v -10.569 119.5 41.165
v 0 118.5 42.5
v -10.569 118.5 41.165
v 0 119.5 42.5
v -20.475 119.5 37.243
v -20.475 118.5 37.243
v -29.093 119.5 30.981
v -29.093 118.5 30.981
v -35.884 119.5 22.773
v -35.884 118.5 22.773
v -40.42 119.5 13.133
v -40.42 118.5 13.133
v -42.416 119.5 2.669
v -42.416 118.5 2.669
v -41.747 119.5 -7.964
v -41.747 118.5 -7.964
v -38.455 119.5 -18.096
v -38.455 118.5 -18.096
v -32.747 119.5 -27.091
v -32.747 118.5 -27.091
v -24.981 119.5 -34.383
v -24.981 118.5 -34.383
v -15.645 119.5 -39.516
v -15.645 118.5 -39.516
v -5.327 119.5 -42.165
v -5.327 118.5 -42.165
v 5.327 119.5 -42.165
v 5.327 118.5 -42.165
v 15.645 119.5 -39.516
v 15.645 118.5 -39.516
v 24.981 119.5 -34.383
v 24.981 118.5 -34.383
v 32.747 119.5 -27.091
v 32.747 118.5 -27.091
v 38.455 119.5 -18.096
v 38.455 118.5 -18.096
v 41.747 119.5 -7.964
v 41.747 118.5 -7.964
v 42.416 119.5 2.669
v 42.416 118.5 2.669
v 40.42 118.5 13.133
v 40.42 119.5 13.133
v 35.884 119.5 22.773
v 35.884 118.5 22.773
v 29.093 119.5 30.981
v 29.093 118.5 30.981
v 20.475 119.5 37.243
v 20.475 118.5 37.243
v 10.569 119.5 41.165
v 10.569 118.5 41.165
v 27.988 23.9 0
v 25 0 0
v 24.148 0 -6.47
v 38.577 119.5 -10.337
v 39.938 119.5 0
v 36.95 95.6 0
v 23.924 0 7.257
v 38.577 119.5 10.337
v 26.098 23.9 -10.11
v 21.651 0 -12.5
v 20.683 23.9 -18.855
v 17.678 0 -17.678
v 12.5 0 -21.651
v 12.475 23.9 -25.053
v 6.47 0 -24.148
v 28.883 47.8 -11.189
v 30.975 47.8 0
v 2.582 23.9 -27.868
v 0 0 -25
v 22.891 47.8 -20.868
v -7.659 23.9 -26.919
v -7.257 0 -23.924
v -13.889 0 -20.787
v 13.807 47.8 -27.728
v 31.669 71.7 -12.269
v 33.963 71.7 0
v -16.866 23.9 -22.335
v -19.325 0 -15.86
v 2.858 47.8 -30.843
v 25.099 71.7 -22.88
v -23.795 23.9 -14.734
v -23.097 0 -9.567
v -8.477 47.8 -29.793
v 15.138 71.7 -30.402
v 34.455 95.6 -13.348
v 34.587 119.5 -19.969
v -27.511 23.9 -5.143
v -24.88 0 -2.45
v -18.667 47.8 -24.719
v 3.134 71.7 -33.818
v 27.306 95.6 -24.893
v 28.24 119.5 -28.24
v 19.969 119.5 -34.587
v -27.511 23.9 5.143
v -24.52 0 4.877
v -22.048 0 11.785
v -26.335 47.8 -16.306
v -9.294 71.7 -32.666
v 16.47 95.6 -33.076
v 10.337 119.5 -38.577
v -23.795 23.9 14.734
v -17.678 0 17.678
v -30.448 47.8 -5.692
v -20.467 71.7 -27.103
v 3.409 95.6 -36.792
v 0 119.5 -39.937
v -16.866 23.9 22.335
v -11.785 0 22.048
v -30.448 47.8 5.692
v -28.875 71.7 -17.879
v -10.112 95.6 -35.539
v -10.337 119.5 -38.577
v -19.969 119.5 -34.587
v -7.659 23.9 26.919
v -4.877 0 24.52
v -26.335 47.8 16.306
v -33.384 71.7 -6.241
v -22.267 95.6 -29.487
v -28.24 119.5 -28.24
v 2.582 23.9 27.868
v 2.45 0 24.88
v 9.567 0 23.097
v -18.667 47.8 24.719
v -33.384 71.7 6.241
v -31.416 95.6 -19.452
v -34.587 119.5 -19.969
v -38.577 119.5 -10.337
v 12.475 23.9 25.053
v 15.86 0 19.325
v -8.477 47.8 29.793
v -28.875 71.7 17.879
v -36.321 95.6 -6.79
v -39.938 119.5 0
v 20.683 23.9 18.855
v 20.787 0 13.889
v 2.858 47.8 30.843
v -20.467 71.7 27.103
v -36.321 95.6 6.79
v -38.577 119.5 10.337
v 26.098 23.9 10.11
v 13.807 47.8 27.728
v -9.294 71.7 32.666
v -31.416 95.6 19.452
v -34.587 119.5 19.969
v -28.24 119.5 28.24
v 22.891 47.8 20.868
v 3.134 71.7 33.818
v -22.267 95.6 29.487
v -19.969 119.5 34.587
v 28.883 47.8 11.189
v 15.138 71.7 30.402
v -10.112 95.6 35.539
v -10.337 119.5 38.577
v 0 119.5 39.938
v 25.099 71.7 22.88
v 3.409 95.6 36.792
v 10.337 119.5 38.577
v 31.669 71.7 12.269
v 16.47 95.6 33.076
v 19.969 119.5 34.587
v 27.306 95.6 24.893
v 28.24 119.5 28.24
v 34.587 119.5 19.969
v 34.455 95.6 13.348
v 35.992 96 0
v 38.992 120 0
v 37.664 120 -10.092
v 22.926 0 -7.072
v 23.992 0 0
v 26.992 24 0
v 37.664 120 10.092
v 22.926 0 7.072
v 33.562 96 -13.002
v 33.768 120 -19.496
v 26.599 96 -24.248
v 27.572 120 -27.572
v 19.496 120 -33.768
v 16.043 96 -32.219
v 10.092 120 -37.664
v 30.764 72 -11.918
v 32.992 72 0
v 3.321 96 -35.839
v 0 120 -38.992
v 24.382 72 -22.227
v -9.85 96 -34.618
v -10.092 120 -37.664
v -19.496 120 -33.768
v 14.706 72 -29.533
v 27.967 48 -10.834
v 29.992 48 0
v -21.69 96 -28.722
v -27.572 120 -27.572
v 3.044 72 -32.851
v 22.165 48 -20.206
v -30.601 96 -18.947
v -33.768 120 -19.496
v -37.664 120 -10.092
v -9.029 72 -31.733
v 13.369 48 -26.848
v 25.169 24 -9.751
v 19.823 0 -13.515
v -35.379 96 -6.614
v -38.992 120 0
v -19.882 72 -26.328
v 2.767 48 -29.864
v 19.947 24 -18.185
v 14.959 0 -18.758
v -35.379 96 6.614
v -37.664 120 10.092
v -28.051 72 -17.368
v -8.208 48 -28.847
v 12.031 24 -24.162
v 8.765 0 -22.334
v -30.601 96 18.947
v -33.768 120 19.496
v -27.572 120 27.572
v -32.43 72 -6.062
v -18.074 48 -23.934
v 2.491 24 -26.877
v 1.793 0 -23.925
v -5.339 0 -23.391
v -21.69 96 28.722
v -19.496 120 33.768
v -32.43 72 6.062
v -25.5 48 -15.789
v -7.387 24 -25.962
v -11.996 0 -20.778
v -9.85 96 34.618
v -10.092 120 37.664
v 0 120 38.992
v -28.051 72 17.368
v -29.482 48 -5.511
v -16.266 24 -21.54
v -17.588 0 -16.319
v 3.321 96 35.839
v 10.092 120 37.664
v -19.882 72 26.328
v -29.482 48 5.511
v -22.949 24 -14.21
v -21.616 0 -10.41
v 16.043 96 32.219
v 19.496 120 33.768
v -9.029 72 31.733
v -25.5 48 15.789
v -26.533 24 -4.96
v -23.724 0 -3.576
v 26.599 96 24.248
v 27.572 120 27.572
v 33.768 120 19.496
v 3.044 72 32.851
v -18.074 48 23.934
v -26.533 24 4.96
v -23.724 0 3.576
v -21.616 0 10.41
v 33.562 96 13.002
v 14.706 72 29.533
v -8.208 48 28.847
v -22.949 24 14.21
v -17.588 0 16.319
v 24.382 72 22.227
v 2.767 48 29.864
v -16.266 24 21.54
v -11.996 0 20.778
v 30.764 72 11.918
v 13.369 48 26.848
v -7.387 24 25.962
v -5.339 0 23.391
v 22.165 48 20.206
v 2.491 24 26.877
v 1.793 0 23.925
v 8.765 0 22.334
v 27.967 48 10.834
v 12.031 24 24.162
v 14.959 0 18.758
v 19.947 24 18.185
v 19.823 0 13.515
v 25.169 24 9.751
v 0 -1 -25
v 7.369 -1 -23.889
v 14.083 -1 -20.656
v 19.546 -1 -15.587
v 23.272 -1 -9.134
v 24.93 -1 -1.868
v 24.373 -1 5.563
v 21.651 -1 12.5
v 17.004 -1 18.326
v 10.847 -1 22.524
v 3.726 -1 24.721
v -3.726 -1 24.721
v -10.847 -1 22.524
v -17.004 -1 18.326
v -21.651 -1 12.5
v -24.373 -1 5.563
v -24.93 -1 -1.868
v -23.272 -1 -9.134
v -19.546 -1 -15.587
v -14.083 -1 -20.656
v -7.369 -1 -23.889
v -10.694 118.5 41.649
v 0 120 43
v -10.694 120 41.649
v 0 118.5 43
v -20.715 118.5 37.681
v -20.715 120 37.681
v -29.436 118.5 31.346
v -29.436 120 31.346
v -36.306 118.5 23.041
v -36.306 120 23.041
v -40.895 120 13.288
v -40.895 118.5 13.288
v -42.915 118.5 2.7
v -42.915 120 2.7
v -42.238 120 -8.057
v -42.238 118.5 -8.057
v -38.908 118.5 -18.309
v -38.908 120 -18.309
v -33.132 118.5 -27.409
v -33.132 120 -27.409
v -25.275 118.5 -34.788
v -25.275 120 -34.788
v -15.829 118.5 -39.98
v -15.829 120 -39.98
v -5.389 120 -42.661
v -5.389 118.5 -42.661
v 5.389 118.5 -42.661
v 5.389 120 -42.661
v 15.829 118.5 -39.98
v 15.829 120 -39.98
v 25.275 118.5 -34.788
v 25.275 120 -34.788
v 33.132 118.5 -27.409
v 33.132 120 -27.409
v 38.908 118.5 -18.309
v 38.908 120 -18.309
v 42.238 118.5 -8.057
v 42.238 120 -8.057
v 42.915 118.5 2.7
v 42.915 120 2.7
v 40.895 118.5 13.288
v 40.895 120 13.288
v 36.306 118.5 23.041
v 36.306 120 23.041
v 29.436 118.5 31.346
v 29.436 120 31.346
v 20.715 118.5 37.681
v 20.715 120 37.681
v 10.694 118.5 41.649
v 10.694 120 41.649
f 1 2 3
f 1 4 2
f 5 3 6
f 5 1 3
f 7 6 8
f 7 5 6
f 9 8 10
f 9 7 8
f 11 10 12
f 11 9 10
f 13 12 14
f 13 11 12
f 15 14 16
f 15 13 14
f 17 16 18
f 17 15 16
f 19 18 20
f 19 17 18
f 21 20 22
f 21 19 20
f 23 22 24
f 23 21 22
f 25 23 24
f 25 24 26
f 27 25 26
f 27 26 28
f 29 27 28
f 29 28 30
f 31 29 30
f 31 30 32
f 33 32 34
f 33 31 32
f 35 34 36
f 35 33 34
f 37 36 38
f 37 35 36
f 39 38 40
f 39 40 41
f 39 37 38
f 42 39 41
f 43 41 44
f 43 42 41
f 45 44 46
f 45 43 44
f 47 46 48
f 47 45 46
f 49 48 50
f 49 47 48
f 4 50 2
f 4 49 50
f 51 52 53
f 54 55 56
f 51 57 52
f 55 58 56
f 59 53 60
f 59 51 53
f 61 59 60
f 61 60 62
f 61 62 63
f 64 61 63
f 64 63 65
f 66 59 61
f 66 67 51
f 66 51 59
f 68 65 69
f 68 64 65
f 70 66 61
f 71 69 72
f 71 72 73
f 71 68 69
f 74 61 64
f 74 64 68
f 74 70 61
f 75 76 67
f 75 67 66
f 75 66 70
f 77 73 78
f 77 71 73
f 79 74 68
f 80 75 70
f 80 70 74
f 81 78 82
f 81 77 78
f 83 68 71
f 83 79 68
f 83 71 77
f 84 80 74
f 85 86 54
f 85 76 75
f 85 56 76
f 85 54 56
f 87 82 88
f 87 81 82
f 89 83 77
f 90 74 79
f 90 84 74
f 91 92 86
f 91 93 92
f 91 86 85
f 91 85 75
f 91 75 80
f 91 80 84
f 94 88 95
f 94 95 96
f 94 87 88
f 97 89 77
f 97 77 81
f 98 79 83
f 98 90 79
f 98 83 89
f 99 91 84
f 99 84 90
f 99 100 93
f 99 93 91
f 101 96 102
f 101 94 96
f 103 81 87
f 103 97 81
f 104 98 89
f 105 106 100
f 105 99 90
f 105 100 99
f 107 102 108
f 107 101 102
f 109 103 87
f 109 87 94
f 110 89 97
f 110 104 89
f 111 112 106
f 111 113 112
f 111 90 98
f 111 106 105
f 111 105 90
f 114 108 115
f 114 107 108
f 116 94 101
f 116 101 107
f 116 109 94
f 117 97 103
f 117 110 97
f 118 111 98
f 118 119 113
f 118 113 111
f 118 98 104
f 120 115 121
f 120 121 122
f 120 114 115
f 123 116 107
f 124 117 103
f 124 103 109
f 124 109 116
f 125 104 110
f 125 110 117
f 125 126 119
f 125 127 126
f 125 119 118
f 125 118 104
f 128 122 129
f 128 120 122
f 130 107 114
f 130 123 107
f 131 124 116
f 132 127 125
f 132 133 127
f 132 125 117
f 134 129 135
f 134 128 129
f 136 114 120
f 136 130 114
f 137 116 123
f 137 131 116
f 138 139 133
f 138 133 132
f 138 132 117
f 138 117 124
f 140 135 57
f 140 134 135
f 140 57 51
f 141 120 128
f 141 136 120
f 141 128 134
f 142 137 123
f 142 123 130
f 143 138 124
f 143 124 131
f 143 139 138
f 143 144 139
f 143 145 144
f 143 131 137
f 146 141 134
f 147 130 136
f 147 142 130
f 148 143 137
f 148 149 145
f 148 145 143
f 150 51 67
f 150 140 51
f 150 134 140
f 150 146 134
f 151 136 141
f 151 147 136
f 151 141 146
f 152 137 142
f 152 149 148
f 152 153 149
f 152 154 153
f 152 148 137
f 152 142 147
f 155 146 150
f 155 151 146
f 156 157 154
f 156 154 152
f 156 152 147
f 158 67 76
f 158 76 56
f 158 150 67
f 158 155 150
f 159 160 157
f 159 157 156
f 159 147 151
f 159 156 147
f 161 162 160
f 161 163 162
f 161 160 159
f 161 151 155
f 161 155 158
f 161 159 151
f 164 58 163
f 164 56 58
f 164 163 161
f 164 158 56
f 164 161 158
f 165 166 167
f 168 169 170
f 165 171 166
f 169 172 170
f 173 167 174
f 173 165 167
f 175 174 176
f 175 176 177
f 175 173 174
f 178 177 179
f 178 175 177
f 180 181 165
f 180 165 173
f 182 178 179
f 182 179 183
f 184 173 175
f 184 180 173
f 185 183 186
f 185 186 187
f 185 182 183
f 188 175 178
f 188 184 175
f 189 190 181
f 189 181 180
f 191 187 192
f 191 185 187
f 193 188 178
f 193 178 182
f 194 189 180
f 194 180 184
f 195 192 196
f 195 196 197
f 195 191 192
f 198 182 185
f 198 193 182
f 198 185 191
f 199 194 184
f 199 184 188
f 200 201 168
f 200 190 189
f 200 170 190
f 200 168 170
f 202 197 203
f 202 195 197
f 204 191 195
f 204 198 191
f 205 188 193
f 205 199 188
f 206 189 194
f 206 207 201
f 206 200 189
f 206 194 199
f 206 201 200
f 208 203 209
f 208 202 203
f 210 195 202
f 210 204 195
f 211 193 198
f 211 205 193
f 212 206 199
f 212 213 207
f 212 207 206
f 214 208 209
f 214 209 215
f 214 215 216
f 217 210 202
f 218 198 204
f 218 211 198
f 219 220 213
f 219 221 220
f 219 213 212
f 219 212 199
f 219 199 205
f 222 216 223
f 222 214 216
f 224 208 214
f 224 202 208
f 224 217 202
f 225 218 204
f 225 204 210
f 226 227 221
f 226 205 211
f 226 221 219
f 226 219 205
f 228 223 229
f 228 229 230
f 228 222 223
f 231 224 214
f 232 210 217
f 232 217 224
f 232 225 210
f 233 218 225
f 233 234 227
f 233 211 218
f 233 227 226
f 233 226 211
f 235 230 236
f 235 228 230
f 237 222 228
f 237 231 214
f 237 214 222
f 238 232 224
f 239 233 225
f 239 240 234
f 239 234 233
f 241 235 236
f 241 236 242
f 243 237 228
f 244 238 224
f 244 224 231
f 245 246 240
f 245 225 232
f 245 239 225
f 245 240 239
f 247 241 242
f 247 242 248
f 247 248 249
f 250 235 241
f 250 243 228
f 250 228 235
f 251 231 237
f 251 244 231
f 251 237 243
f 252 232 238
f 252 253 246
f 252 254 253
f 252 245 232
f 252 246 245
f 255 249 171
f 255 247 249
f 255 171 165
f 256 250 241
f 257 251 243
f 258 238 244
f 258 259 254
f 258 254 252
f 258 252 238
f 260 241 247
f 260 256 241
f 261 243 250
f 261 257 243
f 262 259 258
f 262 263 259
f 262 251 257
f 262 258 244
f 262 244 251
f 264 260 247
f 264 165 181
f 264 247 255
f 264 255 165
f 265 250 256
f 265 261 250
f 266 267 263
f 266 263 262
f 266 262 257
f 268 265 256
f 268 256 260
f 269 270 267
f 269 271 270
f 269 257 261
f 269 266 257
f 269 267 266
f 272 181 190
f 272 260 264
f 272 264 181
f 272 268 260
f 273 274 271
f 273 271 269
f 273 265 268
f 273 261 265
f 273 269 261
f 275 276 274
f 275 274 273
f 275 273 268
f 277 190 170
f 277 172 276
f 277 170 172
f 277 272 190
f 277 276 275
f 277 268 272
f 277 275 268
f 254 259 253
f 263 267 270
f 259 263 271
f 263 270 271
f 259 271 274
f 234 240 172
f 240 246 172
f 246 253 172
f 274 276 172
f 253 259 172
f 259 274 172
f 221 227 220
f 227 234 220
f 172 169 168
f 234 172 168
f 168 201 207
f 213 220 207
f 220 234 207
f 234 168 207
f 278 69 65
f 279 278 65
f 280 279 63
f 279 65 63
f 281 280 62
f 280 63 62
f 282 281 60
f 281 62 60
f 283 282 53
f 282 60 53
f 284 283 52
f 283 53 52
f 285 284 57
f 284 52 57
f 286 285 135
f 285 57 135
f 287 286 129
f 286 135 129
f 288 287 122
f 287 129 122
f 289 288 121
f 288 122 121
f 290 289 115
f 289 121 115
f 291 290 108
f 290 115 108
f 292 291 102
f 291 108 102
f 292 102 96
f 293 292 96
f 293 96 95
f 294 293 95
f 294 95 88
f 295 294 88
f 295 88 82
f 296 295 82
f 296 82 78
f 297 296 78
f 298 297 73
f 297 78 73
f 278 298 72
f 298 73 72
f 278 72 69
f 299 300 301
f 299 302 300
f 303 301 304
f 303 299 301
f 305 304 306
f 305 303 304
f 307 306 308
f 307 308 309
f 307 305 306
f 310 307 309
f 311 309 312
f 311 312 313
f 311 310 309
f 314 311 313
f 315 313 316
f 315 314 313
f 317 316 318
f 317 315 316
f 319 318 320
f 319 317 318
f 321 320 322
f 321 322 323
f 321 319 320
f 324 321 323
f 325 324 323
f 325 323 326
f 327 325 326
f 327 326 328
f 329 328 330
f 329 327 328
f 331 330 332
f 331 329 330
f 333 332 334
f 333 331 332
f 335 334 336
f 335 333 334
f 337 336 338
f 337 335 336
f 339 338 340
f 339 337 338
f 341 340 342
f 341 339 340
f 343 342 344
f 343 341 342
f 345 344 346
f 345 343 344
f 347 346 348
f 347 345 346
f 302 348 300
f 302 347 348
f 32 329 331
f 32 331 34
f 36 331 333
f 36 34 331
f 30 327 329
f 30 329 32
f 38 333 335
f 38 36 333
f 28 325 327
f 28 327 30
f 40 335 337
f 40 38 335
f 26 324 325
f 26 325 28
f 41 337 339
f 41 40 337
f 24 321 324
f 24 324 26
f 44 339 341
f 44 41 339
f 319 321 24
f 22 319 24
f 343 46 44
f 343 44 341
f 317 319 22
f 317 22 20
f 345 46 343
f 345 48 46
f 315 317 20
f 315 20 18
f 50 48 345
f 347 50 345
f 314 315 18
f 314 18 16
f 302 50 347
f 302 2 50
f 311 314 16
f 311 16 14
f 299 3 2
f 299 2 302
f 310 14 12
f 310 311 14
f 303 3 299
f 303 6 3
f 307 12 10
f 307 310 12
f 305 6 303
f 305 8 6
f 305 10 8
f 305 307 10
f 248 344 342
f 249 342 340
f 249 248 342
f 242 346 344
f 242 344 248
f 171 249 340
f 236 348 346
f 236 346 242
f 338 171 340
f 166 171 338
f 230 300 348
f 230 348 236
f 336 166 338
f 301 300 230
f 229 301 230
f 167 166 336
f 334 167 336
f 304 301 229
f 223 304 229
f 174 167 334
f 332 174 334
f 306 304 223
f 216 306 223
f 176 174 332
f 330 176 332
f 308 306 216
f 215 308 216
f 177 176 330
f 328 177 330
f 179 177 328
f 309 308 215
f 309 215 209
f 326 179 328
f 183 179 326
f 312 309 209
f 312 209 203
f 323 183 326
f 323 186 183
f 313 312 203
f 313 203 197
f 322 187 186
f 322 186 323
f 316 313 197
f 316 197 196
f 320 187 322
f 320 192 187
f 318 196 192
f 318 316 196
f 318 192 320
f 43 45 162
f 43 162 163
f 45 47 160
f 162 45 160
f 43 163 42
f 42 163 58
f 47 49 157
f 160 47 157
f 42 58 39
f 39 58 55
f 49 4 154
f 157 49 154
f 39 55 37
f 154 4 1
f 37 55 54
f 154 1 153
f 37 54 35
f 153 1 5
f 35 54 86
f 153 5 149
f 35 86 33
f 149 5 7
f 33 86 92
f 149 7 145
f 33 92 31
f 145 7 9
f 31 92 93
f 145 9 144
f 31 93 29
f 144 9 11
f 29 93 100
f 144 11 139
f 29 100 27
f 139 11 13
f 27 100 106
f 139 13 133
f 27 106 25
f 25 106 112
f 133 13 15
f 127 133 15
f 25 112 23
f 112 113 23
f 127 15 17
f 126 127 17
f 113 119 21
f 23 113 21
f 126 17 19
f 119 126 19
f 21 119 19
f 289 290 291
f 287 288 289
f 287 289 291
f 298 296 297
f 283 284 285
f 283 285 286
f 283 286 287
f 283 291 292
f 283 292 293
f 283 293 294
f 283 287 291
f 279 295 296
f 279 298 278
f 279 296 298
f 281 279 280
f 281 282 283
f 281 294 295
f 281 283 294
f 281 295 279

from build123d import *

# Parameters (mm, degrees)
SKETCH5_R           = 25
BOSS_EXTRUDE1_DEPTH = 1


# Read off the part's stored shape, not the designer's step: Loft-Thin1
with BuildPart() as part:
    # Loft-Thin1 outline → Loft-Thin1 (revolve)
    with BuildSketch(Plane.XY):
        Polygon((38.992217781, 120), (23.992217781, 0), (25, 0), (40, 120), align=None)
    revolve(axis=Axis((0, 0, 0), (0, 1, 0)))

    # Sketch5 → Boss-Extrude1 (add)
    with BuildSketch(Plane.XZ):
        with Locations(Location((0, 0, 0), (0, 0, 270))):
            Circle(SKETCH5_R)
    extrude(amount=BOSS_EXTRUDE1_DEPTH)

    # Sketch6 → Revolve1 (revolve)
    with BuildSketch(Plane.XY, mode=Mode.PRIVATE) as revolve1_sk:
        Polygon((40, 120), (43, 120), (43, 118.5), (42.5, 118.5), (42.5, 119.5), (40, 119.5), (39.9375, 119.5), align=None)
    revolve(revolve1_sk.sketch.rotate(Axis((0, 120, 0), (0, -1, 0)), 90), axis=Axis((0, 120, 0), (0, -1, 0)))


solid = part.part
